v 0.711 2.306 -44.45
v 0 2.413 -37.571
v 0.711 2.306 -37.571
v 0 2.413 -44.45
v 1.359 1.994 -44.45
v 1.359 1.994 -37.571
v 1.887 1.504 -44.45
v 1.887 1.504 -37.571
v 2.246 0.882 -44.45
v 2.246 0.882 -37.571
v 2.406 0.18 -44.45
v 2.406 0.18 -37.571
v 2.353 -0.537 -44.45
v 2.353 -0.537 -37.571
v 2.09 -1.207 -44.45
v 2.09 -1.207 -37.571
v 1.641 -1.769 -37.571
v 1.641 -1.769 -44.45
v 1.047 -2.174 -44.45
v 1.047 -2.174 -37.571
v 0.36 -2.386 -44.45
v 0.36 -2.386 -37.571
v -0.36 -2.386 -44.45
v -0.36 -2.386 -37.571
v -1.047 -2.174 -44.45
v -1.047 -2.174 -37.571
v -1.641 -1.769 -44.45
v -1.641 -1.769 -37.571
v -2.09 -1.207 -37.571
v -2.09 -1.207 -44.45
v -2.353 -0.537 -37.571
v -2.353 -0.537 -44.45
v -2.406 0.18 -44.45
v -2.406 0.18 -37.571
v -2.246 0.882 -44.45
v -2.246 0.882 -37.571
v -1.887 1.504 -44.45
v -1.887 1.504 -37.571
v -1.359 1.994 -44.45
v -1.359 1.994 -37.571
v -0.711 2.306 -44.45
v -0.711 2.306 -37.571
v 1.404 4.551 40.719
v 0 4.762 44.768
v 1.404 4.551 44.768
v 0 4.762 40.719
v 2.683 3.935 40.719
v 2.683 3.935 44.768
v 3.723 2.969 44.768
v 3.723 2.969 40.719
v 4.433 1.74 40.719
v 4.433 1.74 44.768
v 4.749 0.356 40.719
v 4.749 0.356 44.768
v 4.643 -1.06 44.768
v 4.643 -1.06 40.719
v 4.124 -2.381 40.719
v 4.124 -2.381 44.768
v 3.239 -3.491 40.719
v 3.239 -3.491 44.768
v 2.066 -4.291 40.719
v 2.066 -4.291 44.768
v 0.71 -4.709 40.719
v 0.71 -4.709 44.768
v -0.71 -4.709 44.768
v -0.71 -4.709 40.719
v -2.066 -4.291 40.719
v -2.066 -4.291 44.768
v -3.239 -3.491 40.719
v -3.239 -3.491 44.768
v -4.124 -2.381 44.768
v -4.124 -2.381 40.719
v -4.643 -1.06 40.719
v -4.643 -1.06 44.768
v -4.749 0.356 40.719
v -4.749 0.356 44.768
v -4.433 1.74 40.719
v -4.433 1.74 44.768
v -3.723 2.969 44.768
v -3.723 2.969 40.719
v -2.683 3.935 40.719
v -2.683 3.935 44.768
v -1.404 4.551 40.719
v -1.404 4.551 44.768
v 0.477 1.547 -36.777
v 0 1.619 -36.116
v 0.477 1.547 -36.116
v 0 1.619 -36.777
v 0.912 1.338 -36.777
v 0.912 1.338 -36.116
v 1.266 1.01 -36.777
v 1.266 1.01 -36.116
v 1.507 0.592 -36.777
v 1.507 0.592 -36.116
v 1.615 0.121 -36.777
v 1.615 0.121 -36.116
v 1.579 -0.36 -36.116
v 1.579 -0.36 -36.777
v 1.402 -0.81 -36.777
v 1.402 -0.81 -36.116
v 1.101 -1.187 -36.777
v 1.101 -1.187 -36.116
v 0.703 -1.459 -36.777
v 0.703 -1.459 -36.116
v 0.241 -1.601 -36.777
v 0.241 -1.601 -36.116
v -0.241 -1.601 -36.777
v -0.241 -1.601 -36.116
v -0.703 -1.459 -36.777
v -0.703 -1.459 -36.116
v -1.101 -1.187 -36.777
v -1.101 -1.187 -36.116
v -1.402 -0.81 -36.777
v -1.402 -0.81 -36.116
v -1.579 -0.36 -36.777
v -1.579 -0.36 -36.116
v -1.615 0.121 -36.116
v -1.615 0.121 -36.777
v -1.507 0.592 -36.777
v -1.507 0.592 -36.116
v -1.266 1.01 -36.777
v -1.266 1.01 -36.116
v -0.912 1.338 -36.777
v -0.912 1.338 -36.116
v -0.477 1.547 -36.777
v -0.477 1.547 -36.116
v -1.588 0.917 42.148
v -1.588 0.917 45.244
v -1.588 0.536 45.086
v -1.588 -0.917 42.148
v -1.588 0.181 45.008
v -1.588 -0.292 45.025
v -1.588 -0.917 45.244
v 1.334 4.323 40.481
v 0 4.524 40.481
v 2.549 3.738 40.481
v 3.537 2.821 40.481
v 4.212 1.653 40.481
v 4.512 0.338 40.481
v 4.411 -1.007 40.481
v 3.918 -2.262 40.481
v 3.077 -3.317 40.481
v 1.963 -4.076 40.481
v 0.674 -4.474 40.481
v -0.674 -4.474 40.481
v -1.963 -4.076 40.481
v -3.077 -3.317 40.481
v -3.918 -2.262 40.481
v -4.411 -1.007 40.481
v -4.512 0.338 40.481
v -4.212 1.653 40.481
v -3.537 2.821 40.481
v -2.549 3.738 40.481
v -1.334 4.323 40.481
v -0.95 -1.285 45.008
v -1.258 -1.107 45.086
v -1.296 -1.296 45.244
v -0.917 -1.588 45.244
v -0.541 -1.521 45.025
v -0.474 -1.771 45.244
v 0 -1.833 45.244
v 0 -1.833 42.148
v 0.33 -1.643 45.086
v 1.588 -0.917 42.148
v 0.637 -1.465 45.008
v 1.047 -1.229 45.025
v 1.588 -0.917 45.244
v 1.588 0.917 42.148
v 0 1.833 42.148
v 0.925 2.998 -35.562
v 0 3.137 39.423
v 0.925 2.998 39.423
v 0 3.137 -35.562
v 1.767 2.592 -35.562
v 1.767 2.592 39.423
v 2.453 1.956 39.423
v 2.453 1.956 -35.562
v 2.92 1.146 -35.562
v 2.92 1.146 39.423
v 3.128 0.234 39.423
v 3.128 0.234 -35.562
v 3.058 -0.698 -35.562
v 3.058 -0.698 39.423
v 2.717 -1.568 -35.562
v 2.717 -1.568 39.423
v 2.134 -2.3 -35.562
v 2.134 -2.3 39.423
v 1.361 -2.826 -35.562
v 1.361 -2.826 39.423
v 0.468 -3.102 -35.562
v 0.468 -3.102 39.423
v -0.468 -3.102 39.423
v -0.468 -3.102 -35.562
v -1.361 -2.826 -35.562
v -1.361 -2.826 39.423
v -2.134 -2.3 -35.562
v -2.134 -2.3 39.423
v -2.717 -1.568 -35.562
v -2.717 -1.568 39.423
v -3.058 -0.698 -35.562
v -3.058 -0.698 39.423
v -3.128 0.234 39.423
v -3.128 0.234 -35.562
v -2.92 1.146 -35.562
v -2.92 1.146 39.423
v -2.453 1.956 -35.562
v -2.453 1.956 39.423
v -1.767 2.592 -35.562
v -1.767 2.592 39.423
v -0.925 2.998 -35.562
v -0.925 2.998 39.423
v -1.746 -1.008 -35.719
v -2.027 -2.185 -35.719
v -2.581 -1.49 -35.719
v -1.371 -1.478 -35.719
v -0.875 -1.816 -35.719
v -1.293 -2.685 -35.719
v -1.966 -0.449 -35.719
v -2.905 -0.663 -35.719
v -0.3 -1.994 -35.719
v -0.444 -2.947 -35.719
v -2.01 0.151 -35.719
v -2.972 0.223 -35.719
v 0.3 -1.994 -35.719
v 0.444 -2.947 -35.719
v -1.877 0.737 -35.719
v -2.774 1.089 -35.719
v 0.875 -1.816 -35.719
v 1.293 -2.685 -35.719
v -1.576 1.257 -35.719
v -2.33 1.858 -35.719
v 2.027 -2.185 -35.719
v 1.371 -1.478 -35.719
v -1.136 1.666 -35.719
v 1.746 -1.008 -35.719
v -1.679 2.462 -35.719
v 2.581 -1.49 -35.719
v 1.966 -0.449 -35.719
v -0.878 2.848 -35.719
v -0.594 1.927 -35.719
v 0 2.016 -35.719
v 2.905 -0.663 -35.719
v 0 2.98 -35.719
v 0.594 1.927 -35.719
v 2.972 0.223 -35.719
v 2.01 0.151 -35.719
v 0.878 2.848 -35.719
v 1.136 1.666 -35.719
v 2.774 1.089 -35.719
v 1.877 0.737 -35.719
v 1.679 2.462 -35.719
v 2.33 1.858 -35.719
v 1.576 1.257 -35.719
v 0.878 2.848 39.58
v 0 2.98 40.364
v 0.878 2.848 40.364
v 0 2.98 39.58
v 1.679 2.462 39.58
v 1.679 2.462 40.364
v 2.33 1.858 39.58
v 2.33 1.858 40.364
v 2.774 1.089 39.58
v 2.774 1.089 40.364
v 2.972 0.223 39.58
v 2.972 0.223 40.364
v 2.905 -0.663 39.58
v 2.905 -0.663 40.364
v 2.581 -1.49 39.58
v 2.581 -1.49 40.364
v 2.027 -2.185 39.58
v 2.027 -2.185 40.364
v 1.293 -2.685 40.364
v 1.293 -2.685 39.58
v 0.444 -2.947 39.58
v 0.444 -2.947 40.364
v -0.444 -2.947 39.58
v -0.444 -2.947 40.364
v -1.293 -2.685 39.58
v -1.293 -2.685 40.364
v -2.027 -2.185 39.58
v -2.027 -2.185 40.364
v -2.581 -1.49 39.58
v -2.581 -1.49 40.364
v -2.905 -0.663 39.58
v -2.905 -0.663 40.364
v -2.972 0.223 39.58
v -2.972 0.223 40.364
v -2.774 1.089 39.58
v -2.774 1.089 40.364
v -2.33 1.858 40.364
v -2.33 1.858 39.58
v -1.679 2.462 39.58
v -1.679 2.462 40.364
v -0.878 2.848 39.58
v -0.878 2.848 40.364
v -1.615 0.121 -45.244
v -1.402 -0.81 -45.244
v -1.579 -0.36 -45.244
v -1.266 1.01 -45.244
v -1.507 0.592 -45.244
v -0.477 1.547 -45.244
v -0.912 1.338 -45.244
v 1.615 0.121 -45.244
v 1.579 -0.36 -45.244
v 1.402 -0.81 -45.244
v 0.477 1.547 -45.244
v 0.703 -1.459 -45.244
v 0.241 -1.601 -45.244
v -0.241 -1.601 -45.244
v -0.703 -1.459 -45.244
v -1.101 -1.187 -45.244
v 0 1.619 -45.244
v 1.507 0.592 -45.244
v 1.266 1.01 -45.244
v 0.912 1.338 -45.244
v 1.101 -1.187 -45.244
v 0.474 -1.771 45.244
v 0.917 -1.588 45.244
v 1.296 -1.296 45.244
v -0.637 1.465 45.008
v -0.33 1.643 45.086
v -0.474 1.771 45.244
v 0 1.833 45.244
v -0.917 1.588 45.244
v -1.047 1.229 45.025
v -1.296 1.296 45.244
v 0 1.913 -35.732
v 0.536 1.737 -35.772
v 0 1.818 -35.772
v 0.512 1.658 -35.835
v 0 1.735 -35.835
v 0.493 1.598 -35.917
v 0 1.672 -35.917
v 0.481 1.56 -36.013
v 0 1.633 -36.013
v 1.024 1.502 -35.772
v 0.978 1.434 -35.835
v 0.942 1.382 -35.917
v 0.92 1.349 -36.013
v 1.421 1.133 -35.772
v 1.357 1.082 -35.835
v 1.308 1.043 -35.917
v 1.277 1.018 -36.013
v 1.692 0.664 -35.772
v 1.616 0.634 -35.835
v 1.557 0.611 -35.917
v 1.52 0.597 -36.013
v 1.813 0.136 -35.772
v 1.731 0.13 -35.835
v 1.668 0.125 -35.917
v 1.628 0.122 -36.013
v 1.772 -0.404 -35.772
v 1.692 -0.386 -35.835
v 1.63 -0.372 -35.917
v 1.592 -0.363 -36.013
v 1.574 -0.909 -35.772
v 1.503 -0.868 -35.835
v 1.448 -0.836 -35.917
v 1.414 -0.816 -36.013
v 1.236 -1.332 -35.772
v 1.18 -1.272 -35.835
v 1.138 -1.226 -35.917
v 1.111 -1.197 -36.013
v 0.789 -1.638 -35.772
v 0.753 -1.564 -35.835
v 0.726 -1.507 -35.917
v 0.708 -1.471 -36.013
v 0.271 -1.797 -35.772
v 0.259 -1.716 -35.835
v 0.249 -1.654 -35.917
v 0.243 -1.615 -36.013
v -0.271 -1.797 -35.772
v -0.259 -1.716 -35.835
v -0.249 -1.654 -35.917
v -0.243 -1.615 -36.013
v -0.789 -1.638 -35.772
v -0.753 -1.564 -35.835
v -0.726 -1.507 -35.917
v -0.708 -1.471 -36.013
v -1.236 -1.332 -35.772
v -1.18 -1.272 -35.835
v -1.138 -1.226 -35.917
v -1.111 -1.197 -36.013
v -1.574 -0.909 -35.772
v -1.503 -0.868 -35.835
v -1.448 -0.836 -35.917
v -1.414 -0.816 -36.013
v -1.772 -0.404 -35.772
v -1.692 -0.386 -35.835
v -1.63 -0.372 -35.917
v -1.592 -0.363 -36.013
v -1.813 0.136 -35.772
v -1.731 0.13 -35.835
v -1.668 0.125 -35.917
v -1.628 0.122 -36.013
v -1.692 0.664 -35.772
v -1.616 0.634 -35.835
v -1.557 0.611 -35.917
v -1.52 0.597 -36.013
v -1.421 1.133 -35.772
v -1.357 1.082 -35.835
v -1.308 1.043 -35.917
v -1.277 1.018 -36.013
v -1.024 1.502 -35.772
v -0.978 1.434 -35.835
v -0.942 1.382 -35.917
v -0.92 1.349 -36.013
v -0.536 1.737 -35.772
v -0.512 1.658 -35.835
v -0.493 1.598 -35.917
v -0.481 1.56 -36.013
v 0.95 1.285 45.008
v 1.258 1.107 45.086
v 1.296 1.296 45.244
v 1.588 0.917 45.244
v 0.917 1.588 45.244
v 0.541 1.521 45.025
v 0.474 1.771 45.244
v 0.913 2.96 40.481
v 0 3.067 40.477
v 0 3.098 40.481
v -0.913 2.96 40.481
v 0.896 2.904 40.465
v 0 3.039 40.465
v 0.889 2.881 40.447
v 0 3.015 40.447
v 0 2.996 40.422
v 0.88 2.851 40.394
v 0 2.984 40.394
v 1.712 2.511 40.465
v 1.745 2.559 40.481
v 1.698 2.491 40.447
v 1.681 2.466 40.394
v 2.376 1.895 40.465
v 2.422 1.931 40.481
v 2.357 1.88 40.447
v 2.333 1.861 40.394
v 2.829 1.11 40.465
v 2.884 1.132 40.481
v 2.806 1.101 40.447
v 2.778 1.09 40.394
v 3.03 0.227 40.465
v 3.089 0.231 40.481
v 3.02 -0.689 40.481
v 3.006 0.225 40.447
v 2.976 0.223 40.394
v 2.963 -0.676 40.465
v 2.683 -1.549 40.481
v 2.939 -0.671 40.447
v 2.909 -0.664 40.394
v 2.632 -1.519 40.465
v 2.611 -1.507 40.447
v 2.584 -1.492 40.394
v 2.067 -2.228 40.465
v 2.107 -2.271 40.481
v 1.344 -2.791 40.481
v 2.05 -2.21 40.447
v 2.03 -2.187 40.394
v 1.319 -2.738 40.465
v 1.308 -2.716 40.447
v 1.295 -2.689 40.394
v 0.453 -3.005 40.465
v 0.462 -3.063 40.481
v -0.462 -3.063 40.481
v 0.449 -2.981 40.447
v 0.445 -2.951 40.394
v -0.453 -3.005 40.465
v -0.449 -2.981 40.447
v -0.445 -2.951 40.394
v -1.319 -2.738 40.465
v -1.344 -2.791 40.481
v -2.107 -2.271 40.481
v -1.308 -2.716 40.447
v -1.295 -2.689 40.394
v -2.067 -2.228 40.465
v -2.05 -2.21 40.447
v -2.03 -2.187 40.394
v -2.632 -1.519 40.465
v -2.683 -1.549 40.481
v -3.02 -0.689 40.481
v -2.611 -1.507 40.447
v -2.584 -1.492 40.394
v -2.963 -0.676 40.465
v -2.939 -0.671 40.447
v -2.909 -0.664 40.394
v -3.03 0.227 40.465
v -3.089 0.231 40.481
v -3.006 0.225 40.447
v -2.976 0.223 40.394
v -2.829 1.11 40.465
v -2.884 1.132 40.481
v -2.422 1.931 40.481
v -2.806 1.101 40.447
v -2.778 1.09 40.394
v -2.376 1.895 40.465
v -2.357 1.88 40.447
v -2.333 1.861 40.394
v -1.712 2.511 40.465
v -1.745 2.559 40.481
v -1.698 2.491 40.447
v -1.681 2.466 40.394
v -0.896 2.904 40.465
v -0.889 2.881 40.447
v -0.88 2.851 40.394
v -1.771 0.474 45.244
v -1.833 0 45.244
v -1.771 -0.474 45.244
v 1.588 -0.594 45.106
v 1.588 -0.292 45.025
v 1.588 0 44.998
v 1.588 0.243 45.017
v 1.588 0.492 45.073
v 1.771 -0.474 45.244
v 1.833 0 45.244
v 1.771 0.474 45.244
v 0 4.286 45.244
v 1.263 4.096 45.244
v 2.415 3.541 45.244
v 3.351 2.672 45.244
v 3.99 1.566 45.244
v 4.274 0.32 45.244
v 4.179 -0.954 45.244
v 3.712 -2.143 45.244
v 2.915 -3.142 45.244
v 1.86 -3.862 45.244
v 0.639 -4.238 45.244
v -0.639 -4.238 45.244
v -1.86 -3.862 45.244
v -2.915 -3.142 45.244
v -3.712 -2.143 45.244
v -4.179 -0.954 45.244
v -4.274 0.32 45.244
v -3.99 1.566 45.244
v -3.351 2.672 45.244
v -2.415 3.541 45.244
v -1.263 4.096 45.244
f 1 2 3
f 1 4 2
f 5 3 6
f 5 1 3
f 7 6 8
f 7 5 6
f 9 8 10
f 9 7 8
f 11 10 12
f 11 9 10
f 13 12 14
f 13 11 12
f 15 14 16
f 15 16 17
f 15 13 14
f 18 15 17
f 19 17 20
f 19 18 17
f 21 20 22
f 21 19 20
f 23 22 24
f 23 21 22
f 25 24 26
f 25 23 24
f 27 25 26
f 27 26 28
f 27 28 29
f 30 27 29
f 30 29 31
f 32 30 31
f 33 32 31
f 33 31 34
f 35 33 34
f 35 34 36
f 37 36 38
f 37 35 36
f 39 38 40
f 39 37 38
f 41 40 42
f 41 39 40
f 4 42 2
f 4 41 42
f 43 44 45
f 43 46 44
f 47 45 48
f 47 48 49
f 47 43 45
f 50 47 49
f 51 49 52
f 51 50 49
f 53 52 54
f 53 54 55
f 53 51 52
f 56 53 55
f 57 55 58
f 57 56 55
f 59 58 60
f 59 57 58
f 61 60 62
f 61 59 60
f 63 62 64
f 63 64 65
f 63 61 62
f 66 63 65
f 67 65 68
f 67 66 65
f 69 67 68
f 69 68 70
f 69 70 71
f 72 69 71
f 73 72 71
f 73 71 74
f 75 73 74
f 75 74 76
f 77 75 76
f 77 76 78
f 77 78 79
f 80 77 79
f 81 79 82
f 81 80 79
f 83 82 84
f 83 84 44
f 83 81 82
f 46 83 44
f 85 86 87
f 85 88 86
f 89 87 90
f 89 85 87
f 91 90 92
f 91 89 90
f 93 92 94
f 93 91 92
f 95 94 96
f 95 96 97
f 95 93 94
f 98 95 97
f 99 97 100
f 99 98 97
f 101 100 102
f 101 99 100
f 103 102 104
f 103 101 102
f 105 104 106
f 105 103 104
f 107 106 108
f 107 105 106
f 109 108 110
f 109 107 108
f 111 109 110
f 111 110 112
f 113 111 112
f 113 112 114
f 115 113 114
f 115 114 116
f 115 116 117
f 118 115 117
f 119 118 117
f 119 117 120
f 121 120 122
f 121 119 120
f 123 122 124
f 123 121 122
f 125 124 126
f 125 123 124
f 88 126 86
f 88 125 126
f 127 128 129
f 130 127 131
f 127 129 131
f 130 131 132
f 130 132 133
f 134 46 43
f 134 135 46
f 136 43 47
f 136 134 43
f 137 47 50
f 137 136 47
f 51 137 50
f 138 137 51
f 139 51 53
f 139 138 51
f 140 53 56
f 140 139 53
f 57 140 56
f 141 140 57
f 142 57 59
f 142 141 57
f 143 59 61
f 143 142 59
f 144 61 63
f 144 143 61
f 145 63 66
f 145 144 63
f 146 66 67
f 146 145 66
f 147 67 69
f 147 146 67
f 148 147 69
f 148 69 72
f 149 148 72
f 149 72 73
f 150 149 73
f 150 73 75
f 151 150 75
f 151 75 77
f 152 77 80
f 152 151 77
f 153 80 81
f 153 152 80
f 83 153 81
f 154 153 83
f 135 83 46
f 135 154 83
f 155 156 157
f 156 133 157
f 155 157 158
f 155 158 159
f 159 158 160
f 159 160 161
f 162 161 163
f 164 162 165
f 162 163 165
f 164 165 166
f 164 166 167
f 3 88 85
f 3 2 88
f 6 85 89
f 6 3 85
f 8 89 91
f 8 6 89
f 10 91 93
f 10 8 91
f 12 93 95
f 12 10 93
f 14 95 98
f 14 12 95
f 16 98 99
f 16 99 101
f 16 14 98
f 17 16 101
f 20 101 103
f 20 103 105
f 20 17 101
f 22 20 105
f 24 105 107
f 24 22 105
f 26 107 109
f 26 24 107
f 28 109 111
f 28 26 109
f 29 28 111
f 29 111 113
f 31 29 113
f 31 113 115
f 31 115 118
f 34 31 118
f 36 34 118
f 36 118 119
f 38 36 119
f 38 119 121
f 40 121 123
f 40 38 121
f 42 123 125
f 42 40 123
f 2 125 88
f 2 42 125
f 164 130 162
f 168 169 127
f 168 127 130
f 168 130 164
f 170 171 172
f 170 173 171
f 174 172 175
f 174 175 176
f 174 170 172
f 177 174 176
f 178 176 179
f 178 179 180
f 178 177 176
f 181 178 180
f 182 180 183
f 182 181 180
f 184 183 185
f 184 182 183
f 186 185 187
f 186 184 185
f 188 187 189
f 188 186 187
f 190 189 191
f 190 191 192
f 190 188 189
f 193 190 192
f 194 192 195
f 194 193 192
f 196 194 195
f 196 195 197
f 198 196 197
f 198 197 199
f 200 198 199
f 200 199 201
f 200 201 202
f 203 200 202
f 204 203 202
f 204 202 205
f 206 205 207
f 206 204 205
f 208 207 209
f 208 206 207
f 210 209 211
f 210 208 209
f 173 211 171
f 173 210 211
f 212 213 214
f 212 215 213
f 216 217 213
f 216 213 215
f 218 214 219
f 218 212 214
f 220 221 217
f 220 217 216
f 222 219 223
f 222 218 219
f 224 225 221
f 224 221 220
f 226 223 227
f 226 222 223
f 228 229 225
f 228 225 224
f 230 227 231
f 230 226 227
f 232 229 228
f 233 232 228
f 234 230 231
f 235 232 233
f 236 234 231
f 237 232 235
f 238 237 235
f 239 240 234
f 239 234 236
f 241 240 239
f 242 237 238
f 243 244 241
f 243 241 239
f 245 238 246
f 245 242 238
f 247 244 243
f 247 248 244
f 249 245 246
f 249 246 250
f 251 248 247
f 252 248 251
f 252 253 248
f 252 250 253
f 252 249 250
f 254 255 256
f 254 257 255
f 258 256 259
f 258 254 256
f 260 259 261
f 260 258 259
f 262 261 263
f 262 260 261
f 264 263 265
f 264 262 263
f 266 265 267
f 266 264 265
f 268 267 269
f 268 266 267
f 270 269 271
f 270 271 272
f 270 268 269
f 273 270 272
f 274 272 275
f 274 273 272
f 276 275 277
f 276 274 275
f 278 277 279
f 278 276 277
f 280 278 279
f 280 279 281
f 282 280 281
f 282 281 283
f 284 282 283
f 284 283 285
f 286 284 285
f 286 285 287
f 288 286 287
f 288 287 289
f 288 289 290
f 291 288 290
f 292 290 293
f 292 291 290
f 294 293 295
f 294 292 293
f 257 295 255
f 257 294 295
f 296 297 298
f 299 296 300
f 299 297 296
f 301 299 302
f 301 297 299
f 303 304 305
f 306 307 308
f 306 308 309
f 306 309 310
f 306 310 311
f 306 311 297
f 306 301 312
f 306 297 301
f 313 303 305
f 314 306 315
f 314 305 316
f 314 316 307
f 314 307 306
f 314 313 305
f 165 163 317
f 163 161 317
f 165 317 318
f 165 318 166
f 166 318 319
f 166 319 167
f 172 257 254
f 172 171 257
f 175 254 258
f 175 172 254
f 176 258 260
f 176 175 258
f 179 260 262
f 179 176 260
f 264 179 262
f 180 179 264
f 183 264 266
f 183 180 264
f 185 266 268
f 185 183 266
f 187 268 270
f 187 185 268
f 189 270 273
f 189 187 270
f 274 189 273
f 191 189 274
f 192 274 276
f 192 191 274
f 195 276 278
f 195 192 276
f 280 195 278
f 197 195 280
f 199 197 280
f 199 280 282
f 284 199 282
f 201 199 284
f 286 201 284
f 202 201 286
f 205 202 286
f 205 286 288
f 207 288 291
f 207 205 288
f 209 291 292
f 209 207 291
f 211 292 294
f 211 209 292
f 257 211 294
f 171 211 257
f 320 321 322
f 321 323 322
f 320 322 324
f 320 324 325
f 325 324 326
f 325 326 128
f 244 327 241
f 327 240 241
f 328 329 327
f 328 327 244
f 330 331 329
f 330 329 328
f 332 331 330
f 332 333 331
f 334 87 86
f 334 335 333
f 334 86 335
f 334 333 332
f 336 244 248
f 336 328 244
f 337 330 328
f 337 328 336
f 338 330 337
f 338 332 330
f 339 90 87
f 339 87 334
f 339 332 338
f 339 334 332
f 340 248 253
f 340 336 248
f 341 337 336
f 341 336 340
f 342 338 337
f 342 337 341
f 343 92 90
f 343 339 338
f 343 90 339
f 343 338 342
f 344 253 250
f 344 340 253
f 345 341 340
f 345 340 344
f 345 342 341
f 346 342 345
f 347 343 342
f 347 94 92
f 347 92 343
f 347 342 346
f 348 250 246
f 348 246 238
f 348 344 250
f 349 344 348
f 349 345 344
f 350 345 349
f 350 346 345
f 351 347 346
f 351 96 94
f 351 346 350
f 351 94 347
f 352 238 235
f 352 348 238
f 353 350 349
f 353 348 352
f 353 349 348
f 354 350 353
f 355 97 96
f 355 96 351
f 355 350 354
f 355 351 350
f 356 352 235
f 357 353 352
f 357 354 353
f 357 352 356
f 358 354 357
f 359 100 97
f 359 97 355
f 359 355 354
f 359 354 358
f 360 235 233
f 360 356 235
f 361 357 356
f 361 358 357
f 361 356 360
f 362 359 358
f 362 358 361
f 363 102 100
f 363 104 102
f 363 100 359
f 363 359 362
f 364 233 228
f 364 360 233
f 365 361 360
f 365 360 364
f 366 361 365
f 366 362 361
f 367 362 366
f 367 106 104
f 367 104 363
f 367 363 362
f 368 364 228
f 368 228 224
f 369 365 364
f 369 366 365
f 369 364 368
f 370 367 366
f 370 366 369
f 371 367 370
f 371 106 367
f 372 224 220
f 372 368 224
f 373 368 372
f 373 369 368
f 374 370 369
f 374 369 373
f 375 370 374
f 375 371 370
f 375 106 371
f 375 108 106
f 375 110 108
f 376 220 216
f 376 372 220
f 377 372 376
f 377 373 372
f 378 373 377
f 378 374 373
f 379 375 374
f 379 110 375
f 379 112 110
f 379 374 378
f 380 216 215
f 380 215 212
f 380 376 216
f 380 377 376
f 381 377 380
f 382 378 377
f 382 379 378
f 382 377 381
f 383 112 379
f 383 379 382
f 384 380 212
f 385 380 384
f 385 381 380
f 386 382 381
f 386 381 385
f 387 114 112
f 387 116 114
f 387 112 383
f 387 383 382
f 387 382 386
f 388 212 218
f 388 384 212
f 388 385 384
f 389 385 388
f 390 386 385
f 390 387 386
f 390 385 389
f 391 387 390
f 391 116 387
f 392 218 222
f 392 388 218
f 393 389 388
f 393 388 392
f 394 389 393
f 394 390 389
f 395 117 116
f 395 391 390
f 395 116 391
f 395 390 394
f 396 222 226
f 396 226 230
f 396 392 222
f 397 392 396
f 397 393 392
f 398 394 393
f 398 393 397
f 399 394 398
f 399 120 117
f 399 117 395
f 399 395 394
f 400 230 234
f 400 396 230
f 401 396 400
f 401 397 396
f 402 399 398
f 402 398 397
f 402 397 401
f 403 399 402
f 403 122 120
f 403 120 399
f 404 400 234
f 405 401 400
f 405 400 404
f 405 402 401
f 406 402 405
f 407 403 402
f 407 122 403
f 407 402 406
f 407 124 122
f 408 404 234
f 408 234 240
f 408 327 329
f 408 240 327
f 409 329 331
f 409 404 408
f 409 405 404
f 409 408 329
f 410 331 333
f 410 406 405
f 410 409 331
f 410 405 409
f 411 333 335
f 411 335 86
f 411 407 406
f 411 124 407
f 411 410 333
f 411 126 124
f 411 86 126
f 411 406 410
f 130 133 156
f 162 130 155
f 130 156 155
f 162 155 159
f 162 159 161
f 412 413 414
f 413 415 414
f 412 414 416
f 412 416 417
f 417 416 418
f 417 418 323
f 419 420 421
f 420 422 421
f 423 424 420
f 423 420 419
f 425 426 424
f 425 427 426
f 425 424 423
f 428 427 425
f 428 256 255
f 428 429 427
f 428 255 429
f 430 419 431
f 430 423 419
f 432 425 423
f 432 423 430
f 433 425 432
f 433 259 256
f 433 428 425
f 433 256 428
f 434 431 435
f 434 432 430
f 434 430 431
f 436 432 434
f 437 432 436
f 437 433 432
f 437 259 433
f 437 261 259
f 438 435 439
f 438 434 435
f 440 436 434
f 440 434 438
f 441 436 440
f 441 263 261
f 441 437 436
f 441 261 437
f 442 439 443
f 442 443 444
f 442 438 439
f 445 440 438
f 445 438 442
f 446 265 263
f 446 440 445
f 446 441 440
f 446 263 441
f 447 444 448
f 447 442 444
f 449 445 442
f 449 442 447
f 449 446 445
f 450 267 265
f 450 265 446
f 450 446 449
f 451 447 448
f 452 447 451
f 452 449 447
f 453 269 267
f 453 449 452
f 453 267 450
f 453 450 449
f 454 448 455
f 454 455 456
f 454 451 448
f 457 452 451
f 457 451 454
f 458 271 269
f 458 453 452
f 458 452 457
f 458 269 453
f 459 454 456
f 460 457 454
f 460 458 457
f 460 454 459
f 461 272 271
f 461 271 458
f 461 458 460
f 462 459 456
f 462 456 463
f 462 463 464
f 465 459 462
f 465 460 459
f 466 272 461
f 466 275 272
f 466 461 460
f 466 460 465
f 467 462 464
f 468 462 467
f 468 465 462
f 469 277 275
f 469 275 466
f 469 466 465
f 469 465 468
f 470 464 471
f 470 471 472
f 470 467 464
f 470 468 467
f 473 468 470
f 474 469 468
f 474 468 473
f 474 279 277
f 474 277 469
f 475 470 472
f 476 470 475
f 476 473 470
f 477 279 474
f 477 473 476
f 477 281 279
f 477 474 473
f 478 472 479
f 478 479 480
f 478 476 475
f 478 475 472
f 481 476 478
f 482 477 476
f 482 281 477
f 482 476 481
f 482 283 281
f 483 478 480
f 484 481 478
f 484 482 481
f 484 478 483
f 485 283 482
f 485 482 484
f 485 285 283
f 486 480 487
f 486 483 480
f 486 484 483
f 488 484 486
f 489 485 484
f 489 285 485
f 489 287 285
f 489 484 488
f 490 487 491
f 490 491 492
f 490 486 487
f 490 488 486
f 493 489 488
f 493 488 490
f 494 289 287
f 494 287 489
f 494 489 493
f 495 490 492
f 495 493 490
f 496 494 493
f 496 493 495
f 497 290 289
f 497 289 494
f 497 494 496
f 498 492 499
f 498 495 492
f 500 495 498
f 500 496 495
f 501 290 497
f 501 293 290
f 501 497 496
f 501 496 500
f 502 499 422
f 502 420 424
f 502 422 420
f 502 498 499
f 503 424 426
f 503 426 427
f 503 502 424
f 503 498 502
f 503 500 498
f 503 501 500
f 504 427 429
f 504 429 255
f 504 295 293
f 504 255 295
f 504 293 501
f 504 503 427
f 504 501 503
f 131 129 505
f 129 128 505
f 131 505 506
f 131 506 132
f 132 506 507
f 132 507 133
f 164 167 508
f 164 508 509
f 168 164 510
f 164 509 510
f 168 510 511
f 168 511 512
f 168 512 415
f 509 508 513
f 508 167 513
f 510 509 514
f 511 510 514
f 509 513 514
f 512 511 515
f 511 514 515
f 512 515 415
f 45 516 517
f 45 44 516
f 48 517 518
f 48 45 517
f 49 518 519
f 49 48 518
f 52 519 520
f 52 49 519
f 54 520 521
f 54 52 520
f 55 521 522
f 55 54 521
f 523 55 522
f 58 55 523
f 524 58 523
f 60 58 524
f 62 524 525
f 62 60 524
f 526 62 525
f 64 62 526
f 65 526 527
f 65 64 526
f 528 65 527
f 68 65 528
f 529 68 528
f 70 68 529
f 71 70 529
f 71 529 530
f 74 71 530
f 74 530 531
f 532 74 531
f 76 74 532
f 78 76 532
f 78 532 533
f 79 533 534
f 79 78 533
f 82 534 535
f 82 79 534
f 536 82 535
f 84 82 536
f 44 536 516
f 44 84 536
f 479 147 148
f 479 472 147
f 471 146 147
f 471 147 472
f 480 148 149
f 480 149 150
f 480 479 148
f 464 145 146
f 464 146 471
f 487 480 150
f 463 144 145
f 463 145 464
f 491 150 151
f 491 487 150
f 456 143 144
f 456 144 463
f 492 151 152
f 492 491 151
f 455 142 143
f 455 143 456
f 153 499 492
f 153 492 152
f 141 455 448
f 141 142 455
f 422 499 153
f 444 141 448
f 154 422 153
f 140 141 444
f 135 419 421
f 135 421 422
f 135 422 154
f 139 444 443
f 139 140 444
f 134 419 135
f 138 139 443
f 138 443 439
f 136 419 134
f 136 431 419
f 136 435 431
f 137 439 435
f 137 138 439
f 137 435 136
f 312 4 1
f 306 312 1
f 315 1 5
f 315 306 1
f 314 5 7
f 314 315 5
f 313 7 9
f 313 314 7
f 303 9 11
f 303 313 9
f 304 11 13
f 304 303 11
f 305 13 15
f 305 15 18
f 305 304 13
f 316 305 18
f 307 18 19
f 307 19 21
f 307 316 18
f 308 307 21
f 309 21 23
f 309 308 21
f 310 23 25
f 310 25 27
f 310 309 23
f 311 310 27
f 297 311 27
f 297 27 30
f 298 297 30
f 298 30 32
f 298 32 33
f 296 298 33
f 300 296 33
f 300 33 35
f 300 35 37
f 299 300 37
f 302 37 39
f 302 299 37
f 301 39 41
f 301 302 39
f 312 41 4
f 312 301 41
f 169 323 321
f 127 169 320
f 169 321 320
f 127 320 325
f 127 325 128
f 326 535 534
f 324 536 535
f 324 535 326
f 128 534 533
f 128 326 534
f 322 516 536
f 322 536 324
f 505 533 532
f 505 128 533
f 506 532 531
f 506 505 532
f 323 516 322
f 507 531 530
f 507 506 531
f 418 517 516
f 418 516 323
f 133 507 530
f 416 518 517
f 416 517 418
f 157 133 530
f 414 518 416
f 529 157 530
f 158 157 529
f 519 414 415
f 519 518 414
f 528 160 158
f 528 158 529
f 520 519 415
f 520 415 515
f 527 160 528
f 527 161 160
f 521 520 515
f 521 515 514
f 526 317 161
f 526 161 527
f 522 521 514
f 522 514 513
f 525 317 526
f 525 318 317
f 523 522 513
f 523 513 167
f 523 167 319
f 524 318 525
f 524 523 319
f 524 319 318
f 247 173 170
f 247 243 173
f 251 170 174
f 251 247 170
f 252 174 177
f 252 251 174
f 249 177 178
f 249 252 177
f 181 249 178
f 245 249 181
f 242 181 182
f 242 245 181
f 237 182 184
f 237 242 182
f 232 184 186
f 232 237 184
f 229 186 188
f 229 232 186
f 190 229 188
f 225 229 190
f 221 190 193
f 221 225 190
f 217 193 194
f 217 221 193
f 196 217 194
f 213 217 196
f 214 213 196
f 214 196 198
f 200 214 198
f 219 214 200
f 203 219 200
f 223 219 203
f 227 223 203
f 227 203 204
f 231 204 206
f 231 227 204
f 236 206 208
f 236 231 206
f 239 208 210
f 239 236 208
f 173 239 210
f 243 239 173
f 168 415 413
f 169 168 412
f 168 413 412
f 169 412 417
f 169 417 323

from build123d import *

# Parameters (mm, degrees)
CUT_EXTRUDE1_DEPTH = 3.095625
SKETCH5_R          = 1.833087105
CUT_EXTRUDE2_DEPTH = 3.095625
CUT_EXTRUDE2_DRAFT = -45


with BuildPart() as part:
    # Sketch3 → Revolve1 (revolve)
    with BuildSketch(Plane(origin=(0, 0, 0), x_dir=(0, 0, -1), z_dir=(1, 0, 0))):
        with BuildLine():
            Line((-45.24375, 0), (-45.24375, 4.28625))
            Line((-45.24375, 4.28625), (-44.7675, 4.7625))
            Line((-44.7675, 4.7625), (-40.719375, 4.7625))
            Line((-40.719375, 4.7625), (-40.48125, 4.524375))
            Line((-40.48125, 4.524375), (-40.48125, 3.09768875))
            ThreePointArc((-40.48125, 3.09768875), (-40.446795872, 3.014509128), (-40.36361625, 2.980055))
            Line((-40.36361625, 2.980055), (-39.579761667, 2.980055))
            Line((-39.579761667, 2.980055), (-39.422916667, 3.1369))
            Line((-39.422916667, 3.1369), (35.561905, 3.1369))
            Line((35.561905, 3.1369), (35.71875, 2.980055))
            Line((35.71875, 2.980055), (35.71875, 2.016125))
            ThreePointArc((35.71875, 2.016125), (35.834991996, 1.735491996), (36.115625, 1.61925))
            Line((36.115625, 1.61925), (36.777083333, 1.61925))
            Line((36.777083333, 1.61925), (37.570833333, 2.413))
            Line((37.570833333, 2.413), (44.45, 2.413))
            Line((44.45, 2.413), (45.24375, 1.61925))
            Line((45.24375, 1.61925), (45.24375, 0))
            Line((45.24375, 0), (-45.24375, 0))
        make_face()
    revolve(axis=Axis((0, 0, 45.24375), (0, 0, -1)))

    # Sketch4 → Cut-Extrude1 (cut)
    with BuildSketch(Plane.XY.offset(45.24375)):
        Polygon((-1.5875, -0.916543552), (0, -1.833087105), (1.5875, -0.916543552), (1.5875, 0.916543552), (0, 1.833087105), (-1.5875, 0.916543552), align=None)
    extrude(amount=-CUT_EXTRUDE1_DEPTH, mode=Mode.SUBTRACT)


with BuildPart() as cut_extrude2_tool:
    # Sketch5 → Cut-Extrude2 (with draft: the straight prism first)
    with BuildSketch(Plane.XY.offset(45.24375)):
        Circle(SKETCH5_R)
    extrude(amount=-CUT_EXTRUDE2_DEPTH)
    # Cut-Extrude2: the draft: its side faces are tilted about the plane it starts from
    cut_extrude2_sides = [cut_extrude2_tool.faces().sort_by_distance(p)[0] for p in [
        (-1.833087105, 0, 43.6959375),
    ]]
    draft(cut_extrude2_sides, Plane.XY.offset(45.24375), CUT_EXTRUDE2_DRAFT)


with BuildPart() as part_1:
    add(part.part)

    # Cut-Extrude2: cut by cut_extrude2_tool
    add(cut_extrude2_tool.part, mode=Mode.SUBTRACT)


solid = part_1.part
